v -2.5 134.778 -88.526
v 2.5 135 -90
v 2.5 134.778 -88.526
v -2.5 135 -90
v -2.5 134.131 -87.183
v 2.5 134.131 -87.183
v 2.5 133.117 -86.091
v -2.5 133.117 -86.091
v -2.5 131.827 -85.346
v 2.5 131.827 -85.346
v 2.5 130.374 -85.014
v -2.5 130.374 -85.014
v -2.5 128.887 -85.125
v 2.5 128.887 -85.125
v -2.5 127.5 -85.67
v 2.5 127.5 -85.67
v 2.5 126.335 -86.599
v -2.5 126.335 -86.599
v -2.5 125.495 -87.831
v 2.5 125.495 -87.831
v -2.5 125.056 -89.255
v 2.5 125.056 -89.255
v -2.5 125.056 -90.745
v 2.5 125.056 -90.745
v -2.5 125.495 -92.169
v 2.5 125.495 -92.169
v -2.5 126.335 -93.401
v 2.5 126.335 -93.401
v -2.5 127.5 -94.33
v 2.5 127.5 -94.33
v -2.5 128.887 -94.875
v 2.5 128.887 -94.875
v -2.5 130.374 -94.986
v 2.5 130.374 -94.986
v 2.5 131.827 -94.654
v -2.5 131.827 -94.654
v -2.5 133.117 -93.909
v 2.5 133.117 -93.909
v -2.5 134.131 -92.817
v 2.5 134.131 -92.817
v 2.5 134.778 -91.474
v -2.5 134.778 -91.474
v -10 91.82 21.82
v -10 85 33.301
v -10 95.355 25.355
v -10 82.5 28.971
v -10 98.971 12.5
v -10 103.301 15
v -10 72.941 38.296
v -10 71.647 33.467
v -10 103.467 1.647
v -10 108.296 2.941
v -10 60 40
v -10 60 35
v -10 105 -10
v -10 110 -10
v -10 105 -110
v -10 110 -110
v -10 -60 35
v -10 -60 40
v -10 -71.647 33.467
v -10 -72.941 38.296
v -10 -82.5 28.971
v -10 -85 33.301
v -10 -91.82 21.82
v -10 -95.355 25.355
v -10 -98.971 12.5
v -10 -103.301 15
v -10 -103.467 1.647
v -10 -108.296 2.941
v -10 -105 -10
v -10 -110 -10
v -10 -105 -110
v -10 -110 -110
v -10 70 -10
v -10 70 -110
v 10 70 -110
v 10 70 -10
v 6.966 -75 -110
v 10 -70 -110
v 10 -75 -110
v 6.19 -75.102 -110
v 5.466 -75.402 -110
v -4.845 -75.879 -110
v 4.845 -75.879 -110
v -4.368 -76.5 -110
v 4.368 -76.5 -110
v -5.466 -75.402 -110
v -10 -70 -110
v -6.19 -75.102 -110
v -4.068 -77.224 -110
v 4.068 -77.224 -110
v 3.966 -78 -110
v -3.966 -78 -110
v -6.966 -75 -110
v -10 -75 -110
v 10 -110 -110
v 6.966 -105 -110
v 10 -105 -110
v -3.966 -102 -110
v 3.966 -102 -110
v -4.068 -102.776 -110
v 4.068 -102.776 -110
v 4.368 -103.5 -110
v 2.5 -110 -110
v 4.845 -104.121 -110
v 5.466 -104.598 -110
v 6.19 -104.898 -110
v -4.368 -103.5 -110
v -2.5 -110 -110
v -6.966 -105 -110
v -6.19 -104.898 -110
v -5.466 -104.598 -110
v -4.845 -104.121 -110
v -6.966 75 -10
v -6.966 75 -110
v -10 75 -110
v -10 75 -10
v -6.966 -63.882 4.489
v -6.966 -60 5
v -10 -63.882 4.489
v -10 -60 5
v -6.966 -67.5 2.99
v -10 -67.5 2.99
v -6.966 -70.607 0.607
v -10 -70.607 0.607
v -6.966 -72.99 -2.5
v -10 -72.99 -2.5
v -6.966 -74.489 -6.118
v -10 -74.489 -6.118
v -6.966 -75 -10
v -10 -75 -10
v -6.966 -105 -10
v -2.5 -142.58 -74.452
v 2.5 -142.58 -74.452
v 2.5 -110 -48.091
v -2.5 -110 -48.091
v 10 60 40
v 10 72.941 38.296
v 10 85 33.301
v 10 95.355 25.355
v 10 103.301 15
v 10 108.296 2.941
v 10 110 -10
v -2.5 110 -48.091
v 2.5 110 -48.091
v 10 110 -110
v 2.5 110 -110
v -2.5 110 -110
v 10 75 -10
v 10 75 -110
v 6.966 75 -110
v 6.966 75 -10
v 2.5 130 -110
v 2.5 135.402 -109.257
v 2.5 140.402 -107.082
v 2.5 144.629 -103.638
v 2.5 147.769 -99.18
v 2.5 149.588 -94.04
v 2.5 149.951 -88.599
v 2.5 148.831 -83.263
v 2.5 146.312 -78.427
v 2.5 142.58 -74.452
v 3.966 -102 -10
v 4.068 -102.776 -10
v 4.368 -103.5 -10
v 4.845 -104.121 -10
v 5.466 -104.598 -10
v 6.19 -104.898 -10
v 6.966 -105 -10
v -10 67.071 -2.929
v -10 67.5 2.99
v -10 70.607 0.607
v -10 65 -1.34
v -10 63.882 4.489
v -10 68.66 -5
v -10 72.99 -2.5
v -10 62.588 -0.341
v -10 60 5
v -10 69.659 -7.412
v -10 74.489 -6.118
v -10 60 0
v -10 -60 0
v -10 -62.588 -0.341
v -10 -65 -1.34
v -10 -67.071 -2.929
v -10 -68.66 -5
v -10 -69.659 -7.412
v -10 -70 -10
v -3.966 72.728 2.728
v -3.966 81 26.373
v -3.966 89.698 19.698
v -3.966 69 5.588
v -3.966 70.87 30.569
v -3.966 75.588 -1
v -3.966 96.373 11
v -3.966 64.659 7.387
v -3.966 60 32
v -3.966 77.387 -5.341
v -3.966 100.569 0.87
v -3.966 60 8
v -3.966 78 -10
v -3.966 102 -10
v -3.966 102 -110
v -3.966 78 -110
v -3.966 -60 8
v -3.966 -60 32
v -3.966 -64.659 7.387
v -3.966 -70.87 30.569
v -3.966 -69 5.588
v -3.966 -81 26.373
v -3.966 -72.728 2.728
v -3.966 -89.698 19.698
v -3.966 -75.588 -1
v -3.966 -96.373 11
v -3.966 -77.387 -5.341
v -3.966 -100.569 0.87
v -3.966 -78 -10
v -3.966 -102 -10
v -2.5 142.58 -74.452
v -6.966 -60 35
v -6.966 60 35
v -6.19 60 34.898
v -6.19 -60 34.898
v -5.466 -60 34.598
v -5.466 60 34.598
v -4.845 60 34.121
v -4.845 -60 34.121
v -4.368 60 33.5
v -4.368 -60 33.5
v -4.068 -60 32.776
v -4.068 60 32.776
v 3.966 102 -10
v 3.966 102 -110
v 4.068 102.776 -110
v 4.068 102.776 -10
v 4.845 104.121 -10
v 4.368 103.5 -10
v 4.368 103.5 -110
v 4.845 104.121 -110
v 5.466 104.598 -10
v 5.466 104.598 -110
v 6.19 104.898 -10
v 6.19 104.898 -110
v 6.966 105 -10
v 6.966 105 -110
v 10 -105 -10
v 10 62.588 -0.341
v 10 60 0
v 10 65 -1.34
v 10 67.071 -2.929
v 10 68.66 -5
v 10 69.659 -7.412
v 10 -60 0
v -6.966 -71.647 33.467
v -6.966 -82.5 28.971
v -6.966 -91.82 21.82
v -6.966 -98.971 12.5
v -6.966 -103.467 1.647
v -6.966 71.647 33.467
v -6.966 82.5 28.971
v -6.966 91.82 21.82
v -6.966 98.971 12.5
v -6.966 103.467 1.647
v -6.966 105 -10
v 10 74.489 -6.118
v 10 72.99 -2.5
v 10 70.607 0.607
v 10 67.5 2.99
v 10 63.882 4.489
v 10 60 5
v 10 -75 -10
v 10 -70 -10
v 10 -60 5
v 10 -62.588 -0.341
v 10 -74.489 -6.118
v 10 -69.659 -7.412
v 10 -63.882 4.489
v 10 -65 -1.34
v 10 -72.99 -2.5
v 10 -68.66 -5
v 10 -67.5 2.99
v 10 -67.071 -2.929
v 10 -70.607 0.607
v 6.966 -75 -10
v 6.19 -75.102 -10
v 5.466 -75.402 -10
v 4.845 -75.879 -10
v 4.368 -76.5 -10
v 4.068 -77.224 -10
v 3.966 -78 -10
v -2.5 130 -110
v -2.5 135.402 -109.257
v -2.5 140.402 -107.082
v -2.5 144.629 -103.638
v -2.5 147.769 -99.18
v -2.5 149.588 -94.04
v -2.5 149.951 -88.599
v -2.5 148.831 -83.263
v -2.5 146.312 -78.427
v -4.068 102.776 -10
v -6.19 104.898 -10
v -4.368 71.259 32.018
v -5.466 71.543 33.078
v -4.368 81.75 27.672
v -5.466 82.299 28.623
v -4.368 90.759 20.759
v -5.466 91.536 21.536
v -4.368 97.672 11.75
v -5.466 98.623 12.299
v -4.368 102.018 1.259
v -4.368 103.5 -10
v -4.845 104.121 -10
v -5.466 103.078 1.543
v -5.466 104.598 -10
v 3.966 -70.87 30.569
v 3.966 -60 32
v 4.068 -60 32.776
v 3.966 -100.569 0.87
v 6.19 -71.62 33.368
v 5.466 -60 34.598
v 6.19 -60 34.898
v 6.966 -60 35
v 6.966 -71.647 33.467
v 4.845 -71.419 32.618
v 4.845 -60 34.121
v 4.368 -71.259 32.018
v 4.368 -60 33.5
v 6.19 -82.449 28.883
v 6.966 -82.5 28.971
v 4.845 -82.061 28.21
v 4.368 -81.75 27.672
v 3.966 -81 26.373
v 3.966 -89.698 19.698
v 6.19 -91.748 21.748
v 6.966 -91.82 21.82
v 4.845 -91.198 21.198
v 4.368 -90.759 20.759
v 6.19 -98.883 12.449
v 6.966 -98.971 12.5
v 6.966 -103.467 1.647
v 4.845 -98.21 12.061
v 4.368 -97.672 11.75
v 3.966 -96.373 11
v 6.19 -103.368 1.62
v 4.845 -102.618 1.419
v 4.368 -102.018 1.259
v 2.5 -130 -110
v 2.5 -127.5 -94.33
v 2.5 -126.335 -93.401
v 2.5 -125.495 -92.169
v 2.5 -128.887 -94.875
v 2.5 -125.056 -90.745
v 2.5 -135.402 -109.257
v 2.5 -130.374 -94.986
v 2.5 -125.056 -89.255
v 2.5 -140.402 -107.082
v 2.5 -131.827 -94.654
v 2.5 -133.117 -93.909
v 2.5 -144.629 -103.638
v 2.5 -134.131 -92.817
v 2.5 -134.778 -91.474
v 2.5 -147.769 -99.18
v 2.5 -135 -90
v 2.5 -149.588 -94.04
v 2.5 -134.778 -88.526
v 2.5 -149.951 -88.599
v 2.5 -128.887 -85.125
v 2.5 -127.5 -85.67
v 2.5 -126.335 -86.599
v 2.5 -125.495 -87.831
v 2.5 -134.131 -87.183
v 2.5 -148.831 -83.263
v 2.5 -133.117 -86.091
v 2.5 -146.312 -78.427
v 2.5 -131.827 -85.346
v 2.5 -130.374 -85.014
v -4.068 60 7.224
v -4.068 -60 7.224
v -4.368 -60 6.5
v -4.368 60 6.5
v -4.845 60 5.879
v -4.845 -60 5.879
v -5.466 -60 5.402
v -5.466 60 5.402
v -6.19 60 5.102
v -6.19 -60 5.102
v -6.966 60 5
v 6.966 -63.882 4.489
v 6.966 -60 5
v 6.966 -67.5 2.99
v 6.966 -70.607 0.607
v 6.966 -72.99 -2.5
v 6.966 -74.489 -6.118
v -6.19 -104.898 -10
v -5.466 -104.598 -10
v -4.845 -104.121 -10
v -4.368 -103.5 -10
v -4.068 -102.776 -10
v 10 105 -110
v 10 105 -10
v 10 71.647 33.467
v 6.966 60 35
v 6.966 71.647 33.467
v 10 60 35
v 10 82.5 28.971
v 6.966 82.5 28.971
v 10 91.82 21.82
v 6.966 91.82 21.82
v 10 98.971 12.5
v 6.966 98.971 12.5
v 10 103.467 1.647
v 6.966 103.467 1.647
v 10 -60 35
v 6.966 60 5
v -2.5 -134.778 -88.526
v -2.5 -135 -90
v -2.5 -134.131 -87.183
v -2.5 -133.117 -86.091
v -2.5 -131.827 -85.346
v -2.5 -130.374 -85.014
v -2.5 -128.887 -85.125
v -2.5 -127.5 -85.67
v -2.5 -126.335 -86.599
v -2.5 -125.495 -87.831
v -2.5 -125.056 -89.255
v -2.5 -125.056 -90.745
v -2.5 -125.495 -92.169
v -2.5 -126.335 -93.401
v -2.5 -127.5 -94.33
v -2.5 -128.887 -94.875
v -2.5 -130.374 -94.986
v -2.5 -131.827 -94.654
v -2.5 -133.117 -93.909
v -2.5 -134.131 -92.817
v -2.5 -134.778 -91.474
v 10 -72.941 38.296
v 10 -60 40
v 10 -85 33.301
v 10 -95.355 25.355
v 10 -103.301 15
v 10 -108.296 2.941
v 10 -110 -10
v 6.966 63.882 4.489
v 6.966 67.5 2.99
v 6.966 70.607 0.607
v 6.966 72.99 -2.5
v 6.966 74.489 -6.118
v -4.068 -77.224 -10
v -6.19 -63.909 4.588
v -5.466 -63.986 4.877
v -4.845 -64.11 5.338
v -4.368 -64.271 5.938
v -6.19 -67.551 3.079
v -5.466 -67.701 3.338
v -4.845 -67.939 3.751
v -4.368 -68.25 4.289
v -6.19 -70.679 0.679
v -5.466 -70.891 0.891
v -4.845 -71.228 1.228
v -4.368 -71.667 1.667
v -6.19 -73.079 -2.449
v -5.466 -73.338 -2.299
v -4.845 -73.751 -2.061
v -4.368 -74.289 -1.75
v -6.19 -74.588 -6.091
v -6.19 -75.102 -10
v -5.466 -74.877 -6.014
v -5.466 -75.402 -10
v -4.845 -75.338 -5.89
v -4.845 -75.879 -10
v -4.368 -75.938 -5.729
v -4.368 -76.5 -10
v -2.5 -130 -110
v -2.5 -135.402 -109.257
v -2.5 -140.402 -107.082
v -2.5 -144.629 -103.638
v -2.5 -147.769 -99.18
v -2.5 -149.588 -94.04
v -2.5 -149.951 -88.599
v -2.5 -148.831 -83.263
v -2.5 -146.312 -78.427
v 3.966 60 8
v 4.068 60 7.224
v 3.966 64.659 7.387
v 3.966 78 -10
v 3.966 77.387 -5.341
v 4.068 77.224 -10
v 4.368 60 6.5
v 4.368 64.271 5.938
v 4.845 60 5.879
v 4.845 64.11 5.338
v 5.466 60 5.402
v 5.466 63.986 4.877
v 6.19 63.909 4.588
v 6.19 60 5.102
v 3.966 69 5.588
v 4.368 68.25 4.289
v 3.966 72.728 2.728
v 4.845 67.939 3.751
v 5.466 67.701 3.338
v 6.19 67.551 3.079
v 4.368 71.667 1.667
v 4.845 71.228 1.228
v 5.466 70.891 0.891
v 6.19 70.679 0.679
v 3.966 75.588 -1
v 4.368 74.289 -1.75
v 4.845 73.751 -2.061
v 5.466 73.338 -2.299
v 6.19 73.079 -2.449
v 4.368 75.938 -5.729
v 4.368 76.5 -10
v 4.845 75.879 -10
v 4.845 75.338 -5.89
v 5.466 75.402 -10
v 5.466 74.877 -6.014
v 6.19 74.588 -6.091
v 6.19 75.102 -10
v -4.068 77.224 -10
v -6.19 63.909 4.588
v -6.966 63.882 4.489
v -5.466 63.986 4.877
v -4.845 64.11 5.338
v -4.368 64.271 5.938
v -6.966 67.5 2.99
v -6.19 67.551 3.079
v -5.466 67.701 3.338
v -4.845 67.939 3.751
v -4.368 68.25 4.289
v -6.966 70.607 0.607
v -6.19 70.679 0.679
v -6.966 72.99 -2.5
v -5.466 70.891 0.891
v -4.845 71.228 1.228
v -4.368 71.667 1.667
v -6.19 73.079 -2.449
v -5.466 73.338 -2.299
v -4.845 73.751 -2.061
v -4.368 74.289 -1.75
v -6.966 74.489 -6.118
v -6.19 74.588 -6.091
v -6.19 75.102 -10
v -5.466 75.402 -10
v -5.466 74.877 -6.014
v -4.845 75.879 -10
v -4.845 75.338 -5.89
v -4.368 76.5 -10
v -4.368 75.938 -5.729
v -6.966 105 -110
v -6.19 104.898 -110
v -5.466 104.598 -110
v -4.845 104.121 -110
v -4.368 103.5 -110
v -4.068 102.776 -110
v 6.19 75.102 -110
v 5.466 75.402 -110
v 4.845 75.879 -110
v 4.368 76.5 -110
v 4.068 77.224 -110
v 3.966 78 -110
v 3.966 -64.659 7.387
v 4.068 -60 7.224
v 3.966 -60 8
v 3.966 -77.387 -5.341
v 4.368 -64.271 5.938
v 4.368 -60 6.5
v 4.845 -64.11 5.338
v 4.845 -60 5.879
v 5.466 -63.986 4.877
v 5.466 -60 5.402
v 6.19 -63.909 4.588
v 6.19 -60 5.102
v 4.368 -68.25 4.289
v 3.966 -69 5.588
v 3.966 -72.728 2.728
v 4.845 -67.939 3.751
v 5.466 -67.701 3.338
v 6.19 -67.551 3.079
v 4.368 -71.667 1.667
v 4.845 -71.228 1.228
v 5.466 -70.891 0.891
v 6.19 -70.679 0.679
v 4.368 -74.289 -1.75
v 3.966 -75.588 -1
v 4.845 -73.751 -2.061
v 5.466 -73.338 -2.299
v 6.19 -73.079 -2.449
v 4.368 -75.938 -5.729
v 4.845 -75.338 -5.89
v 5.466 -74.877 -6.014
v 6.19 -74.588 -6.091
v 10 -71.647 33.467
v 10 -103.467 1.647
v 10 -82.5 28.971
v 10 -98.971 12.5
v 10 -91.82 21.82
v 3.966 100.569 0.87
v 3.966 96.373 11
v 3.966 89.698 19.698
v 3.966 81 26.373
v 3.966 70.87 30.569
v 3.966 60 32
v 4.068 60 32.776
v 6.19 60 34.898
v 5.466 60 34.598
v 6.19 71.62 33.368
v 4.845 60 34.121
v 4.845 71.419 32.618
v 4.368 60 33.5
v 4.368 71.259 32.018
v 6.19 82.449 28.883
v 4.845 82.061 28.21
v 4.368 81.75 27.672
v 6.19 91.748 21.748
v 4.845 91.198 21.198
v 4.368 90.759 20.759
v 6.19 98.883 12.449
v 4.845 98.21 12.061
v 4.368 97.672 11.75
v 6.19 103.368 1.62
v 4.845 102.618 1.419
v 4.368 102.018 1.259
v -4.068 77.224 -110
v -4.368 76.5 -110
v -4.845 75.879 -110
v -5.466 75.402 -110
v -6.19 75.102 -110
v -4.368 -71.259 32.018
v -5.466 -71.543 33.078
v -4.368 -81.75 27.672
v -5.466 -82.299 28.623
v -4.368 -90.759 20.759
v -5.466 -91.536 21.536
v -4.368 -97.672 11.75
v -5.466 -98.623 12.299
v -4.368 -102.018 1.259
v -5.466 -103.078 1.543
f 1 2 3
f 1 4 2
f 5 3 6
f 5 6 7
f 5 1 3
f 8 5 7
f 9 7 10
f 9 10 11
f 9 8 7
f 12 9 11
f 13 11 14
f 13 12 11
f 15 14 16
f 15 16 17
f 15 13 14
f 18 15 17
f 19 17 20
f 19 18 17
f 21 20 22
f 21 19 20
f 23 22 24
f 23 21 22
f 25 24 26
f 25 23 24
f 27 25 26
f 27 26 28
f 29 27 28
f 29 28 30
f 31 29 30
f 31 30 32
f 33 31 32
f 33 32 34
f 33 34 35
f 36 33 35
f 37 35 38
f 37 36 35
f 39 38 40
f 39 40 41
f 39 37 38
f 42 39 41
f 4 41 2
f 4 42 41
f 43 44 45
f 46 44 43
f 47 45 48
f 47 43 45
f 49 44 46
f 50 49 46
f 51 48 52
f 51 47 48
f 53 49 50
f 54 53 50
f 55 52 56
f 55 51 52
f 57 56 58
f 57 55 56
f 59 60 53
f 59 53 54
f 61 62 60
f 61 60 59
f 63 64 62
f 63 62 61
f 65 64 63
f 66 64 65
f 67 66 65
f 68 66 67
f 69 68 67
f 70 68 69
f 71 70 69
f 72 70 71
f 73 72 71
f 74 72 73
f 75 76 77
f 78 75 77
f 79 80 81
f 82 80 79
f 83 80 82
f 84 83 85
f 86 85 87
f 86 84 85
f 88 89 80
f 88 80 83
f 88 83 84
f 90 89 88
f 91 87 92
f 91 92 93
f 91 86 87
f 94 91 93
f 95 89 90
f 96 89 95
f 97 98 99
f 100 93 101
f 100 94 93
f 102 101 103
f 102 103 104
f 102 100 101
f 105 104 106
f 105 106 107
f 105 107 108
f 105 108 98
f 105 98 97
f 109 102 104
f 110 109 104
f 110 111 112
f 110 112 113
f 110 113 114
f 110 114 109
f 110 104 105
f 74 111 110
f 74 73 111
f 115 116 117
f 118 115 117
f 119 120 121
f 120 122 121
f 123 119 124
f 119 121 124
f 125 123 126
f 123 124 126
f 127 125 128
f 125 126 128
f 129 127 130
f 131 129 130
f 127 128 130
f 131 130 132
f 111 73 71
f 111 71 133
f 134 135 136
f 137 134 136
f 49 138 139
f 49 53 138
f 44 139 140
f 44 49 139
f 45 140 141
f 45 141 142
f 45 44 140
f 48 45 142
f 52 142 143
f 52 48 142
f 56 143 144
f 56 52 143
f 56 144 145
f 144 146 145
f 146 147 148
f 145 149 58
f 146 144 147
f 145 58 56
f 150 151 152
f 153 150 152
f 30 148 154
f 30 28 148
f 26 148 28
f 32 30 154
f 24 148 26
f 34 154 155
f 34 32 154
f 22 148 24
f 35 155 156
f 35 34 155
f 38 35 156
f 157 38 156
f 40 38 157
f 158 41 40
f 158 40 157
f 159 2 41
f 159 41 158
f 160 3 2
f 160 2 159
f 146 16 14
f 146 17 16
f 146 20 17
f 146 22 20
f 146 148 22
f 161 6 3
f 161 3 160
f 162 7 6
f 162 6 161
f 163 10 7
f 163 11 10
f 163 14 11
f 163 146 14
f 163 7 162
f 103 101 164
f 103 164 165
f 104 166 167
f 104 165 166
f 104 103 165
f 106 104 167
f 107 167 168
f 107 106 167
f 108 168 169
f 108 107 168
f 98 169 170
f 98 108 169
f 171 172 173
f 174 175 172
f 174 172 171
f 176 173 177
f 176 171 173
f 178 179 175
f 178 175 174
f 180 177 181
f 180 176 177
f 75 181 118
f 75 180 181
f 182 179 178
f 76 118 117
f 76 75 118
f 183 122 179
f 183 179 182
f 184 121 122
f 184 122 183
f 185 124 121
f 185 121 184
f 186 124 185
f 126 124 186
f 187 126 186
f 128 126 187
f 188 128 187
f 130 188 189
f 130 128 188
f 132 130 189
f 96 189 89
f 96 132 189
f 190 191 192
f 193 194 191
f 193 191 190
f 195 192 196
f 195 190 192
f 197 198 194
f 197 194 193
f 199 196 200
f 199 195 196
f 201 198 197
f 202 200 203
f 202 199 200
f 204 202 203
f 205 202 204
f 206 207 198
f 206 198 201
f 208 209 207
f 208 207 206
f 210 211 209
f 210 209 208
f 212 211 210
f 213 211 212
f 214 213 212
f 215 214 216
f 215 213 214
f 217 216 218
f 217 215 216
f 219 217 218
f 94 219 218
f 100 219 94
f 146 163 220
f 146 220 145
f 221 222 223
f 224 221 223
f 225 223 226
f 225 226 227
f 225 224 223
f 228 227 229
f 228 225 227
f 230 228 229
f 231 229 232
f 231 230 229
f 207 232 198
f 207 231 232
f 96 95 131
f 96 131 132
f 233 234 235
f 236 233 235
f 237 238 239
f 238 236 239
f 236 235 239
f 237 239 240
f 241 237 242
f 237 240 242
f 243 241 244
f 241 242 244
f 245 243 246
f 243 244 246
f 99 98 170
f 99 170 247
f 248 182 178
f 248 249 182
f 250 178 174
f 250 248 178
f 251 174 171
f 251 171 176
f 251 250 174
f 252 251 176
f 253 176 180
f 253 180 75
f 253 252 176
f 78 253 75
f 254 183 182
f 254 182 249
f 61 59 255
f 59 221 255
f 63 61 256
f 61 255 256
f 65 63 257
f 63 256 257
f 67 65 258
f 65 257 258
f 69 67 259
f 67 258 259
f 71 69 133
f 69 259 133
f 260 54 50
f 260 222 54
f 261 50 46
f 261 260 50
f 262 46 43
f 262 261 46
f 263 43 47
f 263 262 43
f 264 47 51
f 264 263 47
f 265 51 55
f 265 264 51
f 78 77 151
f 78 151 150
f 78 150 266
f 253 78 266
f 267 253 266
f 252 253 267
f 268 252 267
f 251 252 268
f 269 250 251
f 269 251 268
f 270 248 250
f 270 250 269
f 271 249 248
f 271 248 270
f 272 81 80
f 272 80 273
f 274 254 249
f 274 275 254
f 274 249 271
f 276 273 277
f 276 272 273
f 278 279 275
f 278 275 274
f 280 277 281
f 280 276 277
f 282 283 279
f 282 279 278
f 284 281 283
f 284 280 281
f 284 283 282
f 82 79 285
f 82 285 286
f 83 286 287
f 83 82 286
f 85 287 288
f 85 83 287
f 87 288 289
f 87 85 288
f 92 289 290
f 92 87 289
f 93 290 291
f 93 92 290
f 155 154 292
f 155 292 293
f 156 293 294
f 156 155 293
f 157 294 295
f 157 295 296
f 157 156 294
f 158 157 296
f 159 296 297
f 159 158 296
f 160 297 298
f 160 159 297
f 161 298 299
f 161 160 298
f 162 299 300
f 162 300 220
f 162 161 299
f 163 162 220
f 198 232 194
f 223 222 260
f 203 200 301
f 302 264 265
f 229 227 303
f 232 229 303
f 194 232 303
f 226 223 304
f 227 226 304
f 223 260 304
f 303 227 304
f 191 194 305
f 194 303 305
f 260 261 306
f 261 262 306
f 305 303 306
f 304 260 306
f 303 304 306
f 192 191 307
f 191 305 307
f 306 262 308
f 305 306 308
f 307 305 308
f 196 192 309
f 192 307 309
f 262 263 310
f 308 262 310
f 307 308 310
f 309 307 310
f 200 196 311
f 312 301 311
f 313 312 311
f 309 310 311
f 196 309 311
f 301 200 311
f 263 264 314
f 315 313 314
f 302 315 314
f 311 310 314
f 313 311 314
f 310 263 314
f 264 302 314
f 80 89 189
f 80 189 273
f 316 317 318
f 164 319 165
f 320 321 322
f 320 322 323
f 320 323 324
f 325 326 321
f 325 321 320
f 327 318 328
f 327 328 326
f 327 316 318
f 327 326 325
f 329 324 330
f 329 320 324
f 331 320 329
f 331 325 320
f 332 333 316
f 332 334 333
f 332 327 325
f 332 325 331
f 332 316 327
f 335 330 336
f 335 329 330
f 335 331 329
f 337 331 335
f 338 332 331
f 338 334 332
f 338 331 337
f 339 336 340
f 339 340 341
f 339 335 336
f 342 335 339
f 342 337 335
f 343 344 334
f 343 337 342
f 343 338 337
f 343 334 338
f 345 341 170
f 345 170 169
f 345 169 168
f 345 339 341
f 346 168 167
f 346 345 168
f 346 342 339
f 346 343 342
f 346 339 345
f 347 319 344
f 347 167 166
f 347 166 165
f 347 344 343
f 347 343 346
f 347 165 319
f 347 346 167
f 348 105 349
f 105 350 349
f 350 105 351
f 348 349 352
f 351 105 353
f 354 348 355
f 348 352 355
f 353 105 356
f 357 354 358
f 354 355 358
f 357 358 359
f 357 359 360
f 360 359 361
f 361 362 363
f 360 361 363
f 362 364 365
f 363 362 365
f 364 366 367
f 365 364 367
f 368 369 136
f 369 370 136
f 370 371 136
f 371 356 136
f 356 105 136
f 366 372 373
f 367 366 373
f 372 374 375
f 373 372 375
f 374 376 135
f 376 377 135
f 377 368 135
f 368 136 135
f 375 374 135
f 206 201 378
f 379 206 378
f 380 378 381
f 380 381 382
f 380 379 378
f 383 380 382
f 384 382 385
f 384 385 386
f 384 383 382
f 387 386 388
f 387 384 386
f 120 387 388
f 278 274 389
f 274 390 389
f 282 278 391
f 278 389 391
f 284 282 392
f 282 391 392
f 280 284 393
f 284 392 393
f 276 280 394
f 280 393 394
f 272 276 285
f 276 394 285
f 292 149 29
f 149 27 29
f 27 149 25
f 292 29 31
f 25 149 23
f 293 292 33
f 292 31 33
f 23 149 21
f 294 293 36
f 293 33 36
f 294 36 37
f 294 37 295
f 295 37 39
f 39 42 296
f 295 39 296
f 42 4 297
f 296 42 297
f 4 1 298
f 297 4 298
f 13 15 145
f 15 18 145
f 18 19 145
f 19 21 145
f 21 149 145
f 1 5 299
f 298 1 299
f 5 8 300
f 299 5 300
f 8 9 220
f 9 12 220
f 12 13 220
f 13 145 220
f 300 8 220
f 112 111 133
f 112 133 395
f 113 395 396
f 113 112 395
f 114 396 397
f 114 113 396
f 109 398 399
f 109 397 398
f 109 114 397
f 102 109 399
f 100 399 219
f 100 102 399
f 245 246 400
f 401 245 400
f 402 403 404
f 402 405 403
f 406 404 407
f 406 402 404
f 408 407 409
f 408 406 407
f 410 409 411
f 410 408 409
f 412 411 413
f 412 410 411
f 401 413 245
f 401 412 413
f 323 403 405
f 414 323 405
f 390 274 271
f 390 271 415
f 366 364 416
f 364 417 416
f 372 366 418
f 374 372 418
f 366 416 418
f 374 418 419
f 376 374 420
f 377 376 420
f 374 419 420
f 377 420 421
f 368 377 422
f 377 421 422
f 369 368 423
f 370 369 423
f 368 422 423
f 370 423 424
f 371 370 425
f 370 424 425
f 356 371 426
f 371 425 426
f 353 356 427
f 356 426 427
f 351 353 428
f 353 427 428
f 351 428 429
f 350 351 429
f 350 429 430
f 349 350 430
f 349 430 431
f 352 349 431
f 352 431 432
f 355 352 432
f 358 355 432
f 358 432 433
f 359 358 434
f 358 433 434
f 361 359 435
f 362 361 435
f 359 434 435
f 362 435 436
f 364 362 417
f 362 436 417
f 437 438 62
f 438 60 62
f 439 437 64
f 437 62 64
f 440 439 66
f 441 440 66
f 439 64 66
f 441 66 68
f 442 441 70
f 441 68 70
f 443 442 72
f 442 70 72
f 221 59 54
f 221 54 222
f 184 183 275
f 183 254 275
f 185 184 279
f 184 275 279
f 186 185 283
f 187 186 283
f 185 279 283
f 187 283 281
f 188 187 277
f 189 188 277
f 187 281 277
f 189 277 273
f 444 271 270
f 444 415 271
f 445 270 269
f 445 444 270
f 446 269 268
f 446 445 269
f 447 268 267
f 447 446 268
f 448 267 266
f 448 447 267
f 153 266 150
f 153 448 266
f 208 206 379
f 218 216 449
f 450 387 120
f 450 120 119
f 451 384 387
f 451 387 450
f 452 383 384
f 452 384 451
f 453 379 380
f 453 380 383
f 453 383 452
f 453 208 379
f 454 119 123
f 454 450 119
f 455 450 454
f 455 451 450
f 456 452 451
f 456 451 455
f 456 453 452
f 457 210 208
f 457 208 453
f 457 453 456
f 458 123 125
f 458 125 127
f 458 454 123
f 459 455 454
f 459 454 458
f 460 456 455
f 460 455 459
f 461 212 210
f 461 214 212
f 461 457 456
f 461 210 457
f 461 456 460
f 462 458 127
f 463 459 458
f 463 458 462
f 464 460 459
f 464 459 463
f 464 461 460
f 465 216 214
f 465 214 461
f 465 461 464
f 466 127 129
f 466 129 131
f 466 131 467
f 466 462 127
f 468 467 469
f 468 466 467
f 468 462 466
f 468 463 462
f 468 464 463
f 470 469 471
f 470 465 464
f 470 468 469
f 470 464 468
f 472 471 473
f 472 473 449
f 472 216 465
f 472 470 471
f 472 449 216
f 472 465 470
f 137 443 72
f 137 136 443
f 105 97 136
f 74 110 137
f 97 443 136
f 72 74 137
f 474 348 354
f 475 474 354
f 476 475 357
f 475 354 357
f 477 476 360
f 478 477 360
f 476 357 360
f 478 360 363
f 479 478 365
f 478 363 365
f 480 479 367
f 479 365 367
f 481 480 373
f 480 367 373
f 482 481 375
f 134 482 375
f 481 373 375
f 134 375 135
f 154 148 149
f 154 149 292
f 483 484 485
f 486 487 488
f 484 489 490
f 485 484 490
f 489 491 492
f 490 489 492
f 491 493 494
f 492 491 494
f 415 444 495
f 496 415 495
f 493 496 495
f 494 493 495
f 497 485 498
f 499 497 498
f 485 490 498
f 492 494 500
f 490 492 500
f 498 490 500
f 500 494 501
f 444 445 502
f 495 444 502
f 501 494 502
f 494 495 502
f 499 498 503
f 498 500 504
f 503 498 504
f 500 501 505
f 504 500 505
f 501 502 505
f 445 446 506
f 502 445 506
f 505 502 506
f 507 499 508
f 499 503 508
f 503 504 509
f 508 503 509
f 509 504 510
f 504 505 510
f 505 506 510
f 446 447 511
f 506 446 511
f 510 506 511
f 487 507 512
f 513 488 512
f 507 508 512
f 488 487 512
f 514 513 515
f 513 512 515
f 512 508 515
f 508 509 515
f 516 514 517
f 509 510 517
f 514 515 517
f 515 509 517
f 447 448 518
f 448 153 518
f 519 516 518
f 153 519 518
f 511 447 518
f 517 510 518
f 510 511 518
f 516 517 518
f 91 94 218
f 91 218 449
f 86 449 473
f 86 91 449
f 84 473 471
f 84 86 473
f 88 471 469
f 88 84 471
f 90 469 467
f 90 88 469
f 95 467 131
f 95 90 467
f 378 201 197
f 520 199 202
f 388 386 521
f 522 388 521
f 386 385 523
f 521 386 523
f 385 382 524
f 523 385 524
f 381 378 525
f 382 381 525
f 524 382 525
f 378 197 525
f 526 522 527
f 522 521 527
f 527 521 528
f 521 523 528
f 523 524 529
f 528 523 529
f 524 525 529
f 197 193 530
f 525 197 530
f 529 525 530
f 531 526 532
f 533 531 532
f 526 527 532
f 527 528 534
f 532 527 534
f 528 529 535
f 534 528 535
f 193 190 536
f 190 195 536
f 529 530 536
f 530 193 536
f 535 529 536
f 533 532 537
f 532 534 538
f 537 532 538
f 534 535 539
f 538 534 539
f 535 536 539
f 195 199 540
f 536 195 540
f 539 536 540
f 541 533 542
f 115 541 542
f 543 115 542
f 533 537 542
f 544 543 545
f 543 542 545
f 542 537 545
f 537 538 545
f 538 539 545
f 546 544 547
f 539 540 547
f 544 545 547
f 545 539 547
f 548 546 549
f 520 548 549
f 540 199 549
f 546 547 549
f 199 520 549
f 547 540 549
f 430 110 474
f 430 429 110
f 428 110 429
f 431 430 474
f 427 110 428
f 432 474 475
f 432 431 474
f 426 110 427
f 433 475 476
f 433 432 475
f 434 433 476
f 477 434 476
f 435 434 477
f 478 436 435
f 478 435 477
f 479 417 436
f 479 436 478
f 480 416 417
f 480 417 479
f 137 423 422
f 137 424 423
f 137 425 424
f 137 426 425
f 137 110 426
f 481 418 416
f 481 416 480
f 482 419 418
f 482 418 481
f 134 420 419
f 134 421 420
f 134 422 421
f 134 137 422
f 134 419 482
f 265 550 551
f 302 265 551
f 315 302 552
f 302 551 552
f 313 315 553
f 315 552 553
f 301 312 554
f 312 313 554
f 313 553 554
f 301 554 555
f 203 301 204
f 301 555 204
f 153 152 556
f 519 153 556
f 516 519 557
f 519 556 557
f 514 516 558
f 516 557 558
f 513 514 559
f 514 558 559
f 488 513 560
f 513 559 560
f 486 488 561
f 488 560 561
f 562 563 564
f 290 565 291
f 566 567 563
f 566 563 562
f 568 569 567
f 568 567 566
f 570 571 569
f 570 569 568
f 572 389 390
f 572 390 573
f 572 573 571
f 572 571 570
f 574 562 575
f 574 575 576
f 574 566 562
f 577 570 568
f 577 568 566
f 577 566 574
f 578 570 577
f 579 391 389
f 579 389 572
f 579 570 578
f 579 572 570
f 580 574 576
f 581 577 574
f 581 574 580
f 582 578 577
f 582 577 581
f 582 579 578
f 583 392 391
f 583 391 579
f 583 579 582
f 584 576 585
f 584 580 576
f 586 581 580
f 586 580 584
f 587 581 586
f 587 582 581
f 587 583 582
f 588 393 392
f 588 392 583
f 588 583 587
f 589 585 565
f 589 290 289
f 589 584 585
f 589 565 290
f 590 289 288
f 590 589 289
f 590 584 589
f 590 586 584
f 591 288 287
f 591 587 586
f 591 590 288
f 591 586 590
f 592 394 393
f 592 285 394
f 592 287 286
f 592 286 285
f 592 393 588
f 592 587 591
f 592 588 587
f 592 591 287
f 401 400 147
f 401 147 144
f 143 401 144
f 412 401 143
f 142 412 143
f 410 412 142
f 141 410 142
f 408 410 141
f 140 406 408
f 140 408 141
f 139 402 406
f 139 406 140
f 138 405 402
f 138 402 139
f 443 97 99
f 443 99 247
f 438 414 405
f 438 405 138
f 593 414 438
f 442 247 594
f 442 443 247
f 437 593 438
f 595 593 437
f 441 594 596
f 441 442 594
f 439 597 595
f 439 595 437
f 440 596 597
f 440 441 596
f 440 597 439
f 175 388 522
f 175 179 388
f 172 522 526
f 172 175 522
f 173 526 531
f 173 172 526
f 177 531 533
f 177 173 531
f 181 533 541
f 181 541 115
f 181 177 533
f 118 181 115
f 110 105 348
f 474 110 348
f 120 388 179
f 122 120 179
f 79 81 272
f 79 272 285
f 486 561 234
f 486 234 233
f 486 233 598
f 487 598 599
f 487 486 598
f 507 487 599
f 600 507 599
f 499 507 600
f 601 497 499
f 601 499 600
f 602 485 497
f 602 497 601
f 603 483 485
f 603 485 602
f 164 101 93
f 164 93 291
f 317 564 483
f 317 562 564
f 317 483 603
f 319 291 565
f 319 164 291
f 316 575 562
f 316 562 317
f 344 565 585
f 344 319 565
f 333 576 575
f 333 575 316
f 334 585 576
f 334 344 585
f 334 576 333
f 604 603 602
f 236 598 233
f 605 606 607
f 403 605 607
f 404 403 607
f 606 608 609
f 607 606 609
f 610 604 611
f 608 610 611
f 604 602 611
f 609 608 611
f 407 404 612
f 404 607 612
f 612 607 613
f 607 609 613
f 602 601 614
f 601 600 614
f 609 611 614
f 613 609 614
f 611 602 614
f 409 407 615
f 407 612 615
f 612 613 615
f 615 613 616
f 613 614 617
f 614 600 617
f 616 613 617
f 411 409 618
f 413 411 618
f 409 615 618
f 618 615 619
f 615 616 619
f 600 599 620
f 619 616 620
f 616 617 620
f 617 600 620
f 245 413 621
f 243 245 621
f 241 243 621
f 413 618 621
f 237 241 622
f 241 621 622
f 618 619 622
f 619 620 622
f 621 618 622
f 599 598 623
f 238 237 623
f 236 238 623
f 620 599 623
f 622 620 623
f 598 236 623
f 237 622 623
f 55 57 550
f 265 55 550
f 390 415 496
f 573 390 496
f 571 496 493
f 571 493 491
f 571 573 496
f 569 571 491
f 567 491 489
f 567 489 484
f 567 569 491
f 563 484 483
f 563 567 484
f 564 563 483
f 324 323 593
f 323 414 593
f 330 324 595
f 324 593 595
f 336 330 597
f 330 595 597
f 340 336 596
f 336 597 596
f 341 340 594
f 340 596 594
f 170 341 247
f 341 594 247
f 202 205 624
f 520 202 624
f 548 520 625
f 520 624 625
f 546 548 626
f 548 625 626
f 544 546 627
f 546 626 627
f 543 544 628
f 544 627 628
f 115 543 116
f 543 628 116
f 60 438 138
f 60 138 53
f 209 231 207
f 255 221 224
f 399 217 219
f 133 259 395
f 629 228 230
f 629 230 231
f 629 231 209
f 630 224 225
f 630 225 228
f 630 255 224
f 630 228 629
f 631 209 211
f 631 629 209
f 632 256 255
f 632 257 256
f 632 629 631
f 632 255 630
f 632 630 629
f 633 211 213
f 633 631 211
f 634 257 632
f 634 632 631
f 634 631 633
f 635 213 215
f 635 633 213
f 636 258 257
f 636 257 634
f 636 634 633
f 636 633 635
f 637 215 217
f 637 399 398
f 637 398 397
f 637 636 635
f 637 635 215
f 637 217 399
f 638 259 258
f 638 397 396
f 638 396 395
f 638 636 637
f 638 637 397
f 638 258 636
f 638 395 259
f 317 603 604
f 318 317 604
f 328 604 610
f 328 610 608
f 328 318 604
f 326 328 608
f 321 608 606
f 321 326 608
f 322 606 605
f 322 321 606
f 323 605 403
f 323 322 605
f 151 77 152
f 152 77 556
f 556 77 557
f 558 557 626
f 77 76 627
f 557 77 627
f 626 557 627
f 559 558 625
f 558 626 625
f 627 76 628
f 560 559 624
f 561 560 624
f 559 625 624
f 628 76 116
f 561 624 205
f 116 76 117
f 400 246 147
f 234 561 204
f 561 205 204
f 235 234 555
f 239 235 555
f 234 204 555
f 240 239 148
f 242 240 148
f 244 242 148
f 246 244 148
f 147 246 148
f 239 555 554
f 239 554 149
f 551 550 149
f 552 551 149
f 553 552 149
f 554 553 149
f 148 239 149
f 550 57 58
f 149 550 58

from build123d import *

# Parameters (mm, degrees)
F4_R     = 5
F5_DEPTH = 2.5


with BuildPart() as f2:
    # F2: sweep along a path in F1
    with BuildLine(Plane.YZ) as f2_path:
        Line((0, 0), (60, 0))
        ThreePointArc((60, 0), (67.0710678119, -2.9289321881), (70, -10))
        Line((70, -10), (70, -110))
    # F0 (on Front) → F2 (sweep)
    with BuildSketch(Plane.XZ):
        with BuildLine():
            Line((-10, 5), (-10, 0))
            Line((-10, 0), (10, 0))
            Line((10, 0), (10, 5))
            Line((10, 5), (6.9661123479, 5))
            ThreePointArc((6.9661123479, 5), (4.8447920043, 5.8786796564), (3.9661123479, 8))
            Line((3.9661123479, 8), (3.9661123479, 32))
            ThreePointArc((3.9661123479, 32), (4.8447920043, 34.1213203436), (6.9661123479, 35))
            Line((6.9661123479, 35), (10, 35))
            Line((10, 35), (10, 40))
            Line((10, 40), (-10, 40))
            Line((-10, 40), (-10, 35))
            Line((-10, 35), (-6.9661123479, 35))
            ThreePointArc((-6.9661123479, 35), (-4.8447920043, 34.1213203436), (-3.9661123479, 32))
            Line((-3.9661123479, 32), (-3.9661123479, 8))
            ThreePointArc((-3.9661123479, 8), (-4.8447920043, 5.8786796564), (-6.9661123479, 5))
            Line((-6.9661123479, 5), (-10, 5))
        make_face()
    sweep(path=f2_path.line)

    # F3: F2 across plane


with BuildPart() as f2_1:
    add(f2.part)
    add(f2.part.mirror(Plane.XZ))

    # F4 (on Right) → F5 (join, symmetric)
    with BuildSketch(Plane.YZ):
        with BuildLine():
            Line((100, -40), (100, -110))
            Line((100, -110), (130, -110))
            ThreePointArc((130, -110), (148.8541892248, -96.6722971064), (142.5800752207, -74.4519548676))
            Line((142.5800752207, -74.4519548676), (100, -40))
        make_face()
        with Locations((130, -90)):
            Circle(F4_R, mode=Mode.SUBTRACT)
    extrude(amount=F5_DEPTH, both=True)

    # F6: F2 across plane


with BuildPart() as f2_2:
    add(f2_1.part)
    add(f2_1.part.mirror(Plane.XZ))


solid = f2_2.part
